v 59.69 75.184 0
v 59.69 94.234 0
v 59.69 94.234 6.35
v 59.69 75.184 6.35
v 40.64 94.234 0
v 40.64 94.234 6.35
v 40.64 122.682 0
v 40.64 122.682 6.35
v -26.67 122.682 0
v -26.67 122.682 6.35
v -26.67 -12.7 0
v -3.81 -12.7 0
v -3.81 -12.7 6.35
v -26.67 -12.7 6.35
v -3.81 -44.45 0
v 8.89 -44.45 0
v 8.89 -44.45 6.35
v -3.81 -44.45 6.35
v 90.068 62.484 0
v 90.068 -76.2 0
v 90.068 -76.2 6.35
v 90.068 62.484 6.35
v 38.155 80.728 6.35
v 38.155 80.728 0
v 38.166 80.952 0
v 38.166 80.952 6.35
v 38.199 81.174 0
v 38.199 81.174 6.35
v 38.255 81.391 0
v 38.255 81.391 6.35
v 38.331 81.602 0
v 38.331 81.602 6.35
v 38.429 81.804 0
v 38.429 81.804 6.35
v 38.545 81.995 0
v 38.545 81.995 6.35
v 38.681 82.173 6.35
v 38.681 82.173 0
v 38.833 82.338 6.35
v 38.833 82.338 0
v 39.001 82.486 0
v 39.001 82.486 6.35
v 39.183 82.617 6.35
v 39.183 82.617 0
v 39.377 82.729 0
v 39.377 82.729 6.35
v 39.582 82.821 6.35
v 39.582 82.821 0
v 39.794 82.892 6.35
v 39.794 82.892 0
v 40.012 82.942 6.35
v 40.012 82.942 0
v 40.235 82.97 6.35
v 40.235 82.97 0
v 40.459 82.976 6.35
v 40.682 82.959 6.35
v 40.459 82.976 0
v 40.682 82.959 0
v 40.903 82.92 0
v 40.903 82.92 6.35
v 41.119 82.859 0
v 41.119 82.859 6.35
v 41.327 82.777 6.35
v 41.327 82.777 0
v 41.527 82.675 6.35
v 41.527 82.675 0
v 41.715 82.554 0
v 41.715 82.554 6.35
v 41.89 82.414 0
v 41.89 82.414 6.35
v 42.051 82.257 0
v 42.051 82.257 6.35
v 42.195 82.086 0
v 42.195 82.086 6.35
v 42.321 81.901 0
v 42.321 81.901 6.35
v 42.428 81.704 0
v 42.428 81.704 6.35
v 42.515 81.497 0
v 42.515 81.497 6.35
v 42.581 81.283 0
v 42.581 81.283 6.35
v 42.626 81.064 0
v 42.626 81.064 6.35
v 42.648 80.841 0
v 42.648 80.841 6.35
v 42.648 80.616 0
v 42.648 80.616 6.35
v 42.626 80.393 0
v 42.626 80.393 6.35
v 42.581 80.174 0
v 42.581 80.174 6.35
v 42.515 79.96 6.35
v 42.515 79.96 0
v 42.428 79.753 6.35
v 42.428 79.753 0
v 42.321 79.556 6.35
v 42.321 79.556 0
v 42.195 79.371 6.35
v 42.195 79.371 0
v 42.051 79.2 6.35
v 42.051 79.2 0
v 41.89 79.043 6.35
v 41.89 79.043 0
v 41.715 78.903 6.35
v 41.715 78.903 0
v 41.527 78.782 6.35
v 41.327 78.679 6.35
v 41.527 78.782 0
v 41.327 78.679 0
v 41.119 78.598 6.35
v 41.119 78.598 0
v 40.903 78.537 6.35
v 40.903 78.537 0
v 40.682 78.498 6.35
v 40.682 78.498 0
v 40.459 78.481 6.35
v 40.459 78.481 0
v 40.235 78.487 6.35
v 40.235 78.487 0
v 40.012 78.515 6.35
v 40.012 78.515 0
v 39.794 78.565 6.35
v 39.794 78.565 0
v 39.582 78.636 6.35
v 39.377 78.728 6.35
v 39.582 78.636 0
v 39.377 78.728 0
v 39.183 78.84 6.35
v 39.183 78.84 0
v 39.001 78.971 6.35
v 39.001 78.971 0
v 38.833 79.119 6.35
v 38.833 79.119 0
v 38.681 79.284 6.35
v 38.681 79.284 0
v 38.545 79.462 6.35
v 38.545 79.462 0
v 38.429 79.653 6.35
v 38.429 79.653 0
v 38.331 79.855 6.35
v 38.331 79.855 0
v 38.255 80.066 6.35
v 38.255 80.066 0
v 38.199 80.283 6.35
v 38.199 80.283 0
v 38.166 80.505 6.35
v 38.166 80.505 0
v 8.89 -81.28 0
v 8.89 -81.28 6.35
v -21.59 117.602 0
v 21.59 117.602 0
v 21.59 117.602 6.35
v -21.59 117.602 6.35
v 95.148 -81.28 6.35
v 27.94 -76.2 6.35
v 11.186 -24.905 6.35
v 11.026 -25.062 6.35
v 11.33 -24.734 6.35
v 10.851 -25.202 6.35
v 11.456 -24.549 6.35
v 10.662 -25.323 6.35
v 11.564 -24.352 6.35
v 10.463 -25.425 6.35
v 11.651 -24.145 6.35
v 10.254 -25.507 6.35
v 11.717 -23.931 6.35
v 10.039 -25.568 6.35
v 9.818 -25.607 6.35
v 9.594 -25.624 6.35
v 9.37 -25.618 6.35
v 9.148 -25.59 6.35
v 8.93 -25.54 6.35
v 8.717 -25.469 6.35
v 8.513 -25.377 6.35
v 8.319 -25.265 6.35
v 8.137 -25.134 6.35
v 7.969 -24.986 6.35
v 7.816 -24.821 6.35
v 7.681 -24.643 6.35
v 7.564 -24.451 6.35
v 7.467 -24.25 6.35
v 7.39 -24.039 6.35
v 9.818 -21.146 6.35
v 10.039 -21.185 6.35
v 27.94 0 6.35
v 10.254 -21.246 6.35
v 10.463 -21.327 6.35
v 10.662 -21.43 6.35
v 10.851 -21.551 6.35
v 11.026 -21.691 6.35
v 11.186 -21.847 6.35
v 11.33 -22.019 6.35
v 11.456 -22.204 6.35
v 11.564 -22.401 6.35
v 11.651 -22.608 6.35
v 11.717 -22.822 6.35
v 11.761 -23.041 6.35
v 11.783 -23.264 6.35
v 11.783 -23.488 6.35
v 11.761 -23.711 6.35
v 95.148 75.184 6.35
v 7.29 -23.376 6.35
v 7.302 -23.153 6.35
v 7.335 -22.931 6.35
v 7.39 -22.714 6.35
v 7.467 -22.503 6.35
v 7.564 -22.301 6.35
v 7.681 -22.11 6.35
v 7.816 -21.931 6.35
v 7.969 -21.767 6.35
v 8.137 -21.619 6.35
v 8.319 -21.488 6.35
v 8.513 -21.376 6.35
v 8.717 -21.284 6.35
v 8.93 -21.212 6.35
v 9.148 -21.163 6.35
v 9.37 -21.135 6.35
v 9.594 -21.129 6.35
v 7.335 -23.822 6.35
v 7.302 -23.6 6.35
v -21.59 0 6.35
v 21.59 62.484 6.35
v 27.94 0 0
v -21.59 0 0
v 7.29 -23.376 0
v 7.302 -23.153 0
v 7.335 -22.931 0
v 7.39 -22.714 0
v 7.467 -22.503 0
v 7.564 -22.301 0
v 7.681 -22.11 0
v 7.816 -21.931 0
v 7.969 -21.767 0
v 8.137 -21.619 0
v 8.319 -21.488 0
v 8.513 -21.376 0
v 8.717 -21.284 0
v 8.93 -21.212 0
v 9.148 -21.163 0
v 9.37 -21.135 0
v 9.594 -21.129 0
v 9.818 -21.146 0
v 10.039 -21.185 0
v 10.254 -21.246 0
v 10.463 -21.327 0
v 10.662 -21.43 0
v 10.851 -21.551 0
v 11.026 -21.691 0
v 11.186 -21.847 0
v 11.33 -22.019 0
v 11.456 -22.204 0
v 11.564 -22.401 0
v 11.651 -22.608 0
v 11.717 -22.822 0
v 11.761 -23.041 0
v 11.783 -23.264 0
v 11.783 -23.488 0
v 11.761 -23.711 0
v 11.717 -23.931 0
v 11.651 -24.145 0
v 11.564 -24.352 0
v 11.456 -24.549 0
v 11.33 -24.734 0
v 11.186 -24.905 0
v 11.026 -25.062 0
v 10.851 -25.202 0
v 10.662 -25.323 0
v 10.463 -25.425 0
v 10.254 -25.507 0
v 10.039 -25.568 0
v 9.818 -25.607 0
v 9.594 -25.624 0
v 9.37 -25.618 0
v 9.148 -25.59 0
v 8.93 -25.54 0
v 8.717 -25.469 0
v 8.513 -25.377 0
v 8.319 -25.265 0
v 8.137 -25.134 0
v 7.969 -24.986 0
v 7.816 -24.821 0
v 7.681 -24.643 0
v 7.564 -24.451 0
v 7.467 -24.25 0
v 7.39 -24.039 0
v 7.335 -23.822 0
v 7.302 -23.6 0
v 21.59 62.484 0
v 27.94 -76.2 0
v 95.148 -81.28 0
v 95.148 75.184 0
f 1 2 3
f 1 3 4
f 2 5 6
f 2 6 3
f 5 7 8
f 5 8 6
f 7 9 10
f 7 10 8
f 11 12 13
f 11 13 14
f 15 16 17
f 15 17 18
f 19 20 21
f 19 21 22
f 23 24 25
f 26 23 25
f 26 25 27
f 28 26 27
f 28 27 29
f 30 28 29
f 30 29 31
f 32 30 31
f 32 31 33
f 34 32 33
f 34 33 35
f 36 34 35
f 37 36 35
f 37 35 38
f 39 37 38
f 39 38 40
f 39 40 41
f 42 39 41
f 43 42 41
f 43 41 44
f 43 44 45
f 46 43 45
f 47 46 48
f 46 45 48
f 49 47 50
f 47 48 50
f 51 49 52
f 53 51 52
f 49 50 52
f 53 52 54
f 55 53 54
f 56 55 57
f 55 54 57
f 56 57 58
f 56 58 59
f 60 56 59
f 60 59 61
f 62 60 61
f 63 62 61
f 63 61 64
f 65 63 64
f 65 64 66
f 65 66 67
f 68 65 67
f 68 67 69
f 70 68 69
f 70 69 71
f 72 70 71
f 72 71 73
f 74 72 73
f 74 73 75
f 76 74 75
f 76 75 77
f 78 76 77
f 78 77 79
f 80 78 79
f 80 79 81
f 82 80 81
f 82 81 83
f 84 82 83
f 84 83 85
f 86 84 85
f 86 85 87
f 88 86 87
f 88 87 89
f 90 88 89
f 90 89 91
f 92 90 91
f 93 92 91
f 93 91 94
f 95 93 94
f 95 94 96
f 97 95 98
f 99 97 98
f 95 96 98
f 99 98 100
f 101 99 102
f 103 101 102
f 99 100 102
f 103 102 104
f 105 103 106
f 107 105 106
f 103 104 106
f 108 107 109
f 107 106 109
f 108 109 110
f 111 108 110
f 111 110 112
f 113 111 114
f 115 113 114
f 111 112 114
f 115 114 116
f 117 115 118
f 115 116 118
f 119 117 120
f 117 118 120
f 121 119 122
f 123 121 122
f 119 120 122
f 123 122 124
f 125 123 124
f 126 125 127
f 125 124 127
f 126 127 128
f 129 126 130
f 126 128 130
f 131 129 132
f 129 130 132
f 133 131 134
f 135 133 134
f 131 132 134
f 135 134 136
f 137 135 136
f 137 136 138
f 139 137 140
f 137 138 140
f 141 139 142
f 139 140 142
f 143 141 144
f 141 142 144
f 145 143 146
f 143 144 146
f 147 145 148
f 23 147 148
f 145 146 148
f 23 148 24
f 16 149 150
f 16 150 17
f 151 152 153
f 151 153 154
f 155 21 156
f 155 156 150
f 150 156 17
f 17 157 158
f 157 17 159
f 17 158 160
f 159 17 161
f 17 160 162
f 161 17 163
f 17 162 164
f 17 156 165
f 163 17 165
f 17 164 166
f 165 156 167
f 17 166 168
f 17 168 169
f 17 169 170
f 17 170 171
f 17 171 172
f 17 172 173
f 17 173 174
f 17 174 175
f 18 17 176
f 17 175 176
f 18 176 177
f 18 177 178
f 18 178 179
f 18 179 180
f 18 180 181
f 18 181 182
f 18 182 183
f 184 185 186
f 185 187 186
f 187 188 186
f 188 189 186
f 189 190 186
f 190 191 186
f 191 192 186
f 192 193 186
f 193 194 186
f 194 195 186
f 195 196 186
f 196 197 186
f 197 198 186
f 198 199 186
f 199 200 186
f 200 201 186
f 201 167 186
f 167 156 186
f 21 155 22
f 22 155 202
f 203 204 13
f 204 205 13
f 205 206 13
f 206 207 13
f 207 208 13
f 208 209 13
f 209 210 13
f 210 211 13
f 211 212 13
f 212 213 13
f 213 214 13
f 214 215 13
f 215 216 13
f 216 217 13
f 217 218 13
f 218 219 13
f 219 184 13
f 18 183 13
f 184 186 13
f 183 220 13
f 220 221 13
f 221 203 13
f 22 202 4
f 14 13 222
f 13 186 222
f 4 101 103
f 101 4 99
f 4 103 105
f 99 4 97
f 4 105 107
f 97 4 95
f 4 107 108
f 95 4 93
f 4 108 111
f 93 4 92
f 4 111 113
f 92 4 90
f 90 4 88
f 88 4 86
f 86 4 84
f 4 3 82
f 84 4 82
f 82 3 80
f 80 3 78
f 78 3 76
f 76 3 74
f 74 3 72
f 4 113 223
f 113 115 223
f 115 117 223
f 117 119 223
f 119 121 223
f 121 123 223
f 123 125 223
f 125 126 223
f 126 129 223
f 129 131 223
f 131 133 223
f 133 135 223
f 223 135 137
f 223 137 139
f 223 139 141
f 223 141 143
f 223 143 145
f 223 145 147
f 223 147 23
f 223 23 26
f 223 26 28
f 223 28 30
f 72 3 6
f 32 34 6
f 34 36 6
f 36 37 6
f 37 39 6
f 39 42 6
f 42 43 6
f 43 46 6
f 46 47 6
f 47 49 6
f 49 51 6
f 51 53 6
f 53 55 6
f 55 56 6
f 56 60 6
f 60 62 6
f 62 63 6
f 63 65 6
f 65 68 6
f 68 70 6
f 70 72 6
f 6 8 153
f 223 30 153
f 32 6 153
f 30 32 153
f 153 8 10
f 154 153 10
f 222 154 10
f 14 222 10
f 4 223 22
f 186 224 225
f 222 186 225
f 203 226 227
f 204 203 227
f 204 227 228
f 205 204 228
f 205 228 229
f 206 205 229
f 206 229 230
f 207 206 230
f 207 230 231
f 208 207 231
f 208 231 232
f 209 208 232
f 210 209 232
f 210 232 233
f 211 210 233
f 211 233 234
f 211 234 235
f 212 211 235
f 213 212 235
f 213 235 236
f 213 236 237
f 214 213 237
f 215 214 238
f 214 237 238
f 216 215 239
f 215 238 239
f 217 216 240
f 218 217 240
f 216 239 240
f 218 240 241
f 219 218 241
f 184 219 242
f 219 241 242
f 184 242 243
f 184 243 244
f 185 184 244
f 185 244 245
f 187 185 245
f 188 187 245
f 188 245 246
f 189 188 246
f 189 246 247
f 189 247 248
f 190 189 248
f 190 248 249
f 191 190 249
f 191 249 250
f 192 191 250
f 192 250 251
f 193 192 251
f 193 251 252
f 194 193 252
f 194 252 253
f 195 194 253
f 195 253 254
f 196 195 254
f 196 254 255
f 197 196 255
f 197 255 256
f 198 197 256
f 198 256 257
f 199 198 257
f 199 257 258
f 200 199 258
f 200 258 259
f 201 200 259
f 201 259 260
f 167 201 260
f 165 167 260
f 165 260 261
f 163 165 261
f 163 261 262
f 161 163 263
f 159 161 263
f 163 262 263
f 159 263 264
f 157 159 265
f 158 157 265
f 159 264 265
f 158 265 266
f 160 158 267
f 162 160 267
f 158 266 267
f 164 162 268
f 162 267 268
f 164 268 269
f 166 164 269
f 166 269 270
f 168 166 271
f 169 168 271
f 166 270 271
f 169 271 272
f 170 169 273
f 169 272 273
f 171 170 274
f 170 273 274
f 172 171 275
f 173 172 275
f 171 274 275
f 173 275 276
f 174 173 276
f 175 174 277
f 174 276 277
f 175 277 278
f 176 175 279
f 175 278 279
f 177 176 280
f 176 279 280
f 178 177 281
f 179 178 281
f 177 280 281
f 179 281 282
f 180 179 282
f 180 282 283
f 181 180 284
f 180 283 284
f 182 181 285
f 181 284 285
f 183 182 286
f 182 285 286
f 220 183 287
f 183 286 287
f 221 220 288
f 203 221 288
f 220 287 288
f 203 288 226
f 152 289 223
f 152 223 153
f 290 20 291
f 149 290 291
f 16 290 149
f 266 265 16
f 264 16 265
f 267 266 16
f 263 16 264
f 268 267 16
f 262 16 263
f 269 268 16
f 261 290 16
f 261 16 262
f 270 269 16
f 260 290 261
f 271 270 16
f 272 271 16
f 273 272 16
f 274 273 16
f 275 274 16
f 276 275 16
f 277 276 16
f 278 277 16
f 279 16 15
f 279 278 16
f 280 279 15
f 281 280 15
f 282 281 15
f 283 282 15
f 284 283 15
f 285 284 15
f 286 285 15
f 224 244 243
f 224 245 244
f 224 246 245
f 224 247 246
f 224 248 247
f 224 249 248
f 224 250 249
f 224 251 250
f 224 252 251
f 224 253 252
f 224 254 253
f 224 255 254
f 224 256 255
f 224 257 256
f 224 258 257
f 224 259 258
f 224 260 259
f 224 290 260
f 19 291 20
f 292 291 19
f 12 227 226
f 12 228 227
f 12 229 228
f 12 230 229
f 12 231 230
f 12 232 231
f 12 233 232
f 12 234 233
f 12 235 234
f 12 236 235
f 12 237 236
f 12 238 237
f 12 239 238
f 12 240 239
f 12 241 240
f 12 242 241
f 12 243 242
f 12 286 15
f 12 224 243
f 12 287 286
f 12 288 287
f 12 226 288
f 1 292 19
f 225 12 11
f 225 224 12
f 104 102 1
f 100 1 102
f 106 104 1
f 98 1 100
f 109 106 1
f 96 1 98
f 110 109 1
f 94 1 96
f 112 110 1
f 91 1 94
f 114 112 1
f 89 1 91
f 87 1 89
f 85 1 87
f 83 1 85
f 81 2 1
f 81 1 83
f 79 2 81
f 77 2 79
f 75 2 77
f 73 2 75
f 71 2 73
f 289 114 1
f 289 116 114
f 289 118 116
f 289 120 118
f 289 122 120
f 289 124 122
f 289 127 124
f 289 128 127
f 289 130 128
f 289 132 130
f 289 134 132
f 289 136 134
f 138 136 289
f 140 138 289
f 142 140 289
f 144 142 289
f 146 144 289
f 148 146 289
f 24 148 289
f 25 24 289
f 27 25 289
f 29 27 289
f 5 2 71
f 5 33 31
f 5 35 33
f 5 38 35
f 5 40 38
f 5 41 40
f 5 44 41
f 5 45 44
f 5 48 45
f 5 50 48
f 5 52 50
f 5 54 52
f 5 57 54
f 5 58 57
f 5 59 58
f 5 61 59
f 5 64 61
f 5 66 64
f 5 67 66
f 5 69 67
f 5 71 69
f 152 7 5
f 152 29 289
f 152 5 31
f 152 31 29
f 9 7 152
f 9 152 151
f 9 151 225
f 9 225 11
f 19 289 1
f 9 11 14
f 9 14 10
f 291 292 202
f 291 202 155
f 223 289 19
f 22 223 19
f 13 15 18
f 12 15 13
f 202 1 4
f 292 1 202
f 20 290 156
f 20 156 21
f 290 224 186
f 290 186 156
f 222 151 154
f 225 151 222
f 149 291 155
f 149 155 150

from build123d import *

# Parameters (mm, degrees)
BOSS_EXTRUDE1_DEPTH   = 6.35
F_8_CLEARANCE_HOLE1_D = 4.4958


with BuildPart() as part:
    # Sketch1 → Boss-Extrude1 (new body)
    with BuildSketch(Plane.XY):
        Polygon((40.64, 122.682), (40.64, 94.234), (59.69, 94.234), (59.69, 75.184), (95.1484, 75.184), (95.1484, -81.28), (8.89, -81.28), (8.89, -44.45), (-3.81, -44.45), (-3.81, -12.7), (-26.67, -12.7), (-26.67, 122.682), align=None)
        Polygon((90.0684, 62.484), (27.94, 62.484), (21.59, 62.484), (21.59, 117.602), (-21.59, 117.602), (-21.59, 0), (21.59, 0), (27.94, 0), (27.94, -76.2), (90.0684, -76.2), align=None, mode=Mode.SUBTRACT)
    extrude(amount=BOSS_EXTRUDE1_DEPTH)

    # #8 Clearance Hole1 (through all)
    with Locations(Plane.XY.offset(6.35)):
        with Locations((9.538335251, -23.376368086), (40.402766773, 80.728472273)):
            Hole(F_8_CLEARANCE_HOLE1_D / 2)


solid = part.part
